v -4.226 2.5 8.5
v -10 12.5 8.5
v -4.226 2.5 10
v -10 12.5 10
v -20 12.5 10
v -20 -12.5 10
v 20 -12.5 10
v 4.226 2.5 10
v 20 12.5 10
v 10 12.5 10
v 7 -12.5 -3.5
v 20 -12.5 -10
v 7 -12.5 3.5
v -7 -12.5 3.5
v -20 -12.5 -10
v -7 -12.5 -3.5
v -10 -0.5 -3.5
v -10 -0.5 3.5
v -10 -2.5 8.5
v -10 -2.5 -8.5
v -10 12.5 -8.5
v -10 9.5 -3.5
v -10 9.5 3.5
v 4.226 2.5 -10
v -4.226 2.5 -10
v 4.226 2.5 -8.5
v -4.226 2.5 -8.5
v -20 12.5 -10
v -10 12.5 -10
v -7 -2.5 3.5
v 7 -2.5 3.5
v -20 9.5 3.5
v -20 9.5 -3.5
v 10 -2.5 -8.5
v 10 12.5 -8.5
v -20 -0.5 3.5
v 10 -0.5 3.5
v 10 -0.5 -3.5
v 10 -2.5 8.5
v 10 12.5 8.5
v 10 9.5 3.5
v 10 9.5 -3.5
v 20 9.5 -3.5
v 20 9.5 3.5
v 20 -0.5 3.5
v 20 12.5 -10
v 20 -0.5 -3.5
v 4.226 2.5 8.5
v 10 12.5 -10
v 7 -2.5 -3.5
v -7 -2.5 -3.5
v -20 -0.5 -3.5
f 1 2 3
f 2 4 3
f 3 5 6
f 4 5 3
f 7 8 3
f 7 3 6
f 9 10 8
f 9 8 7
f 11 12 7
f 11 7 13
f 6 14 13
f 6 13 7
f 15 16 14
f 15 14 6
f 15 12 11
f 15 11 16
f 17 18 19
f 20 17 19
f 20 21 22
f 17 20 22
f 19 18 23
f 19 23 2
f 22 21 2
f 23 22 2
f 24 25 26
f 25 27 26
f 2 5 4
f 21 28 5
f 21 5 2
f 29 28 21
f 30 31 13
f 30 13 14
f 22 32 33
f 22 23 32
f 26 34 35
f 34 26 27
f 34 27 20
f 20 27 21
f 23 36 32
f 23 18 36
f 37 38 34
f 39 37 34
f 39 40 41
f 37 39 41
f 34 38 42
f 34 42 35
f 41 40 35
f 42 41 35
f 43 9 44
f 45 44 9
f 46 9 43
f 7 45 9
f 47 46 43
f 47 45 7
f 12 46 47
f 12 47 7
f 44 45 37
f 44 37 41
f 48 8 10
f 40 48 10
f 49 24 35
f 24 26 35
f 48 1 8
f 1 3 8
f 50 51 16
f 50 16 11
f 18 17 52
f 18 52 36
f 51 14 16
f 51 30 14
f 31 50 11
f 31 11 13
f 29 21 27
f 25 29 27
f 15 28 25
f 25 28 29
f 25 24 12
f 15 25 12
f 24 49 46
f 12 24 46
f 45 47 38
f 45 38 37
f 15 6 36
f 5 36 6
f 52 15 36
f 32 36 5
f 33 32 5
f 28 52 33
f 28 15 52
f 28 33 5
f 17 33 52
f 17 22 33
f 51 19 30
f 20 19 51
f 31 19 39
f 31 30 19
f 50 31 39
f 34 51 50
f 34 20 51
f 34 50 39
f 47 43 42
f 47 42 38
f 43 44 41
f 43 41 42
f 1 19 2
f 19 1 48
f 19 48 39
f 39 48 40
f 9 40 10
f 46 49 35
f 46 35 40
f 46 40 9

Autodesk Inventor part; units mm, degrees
ref_plane "YZ Plane" through (0, 0, 0) normal (1, 0, 0) x (0, 1, 0)
ref_plane "XZ Plane" through (0, 0, 0) normal (0, 1, 0) x (-1, 0, 0)
ref_plane "XY Plane" through (0, 0, 0) normal (0, 0, 1) x (1, 0, 0)
sketch "Náčrt1" plane through (0, 0, 0) normal (0, 0, 1) x (1, 0, 0)
  line L0 (0, 17.5) -> (0, -17.5) projected
  line L1 (-28, 0) -> (28, 0) projected
  line L2 (-20, 12.5) -> (20, 12.5)
  line L3 (20, 12.5) -> (20, -12.5)
  line L4 (20, -12.5) -> (-20, -12.5)
  line L5 (-20, -12.5) -> (-20, 12.5)
  point P0 (0, 0)
  dimension "d0" = 40
  dimension "d1" = 25
extrude "Vysunutí1" add sketch "Náčrt1" along normal mid plane 20
sketch "Náčrt2" plane through (-20, 12.5, -10) normal (0, 1, 0) x (1, 0, 0)
  line L0 (0, 0) -> (40, 0) projected
  line L1 (0, 0) -> (0, -20) projected
  line L2 (40, -20) -> (0, -20) projected
  line L3 (40, 0) -> (40, -20) projected
  line L4 (-8, -10) -> (48, -10) projected
  line L5 (20, 4) -> (20, -24) projected
  line L6 (10, -18.5) -> (30, -18.5)
  line L7 (30, -18.5) -> (30, -1.5)
  line L8 (30, -1.5) -> (10, -1.5)
  line L9 (10, -1.5) -> (10, -18.5)
  point P0 (20, -10)
  dimension "d4" = 17
  dimension "d5" = 20
extrude "Vysunutí2" cut sketch "Náčrt2" against normal blind 15 contours L8 L7 L4 L5 | L5 L4 L9 L8 | L4 L5 L6 L9 | L4 L7 L6 L5
sketch "Náčrt3" plane through (0, 0, 10) normal (0, 0, 1) x (1, 0, 0)
  line L0 (-20, -12.5) -> (20, -12.5) projected
  line L1 (20, -12.5) -> (20, 12.5) projected
  line L2 (20, 12.5) -> (-20, 12.5) projected
  line L3 (-20, 12.5) -> (-20, -12.5) projected
  line L4 (-10, 12.5) -> (-10, -2.5) projected
  line L5 (10, 12.5) -> (10, -2.5) projected
  line L6 (10, -2.5) -> (-10, -2.5) projected
  line L7 (-28, 0) -> (28, 0) projected
  line L8 (0, -17.5) -> (0, 17.5) projected
  line L9 (-10, 12.5) -> (-4.2265, 2.5)
  line L10 (-4.2265, 2.5) -> (4.2265, 2.5)
  line L11 (-20, 12.5) -> (20, 12.5) projected
  line L12 (4.2265, 2.5) -> (10, 12.5)
  line L13 (-10, 12.5) -> (10, 12.5)
  point P0 (0, 0)
  point P1 (0, 3.8397)
  dimension "d8" = 5
  dimension "d9" = 30
  dimension "d10" = 30
extrude "Vysunutí3" cut sketch "Náčrt3" against normal through all contours L2 L8 L10 L9 | L8 L2 L12 L10
sketch "Náčrt5" plane through (20, -12.5, 10) normal (1, 0, 0) x (0, 0, -1)
  line L0 (20, 25) -> (0, 25) projected
  line L1 (0, 0) -> (0, 25) projected
  line L2 (20, 0) -> (0, 0) projected
  line L3 (20, 25) -> (20, 0) projected
  line L4 (18.5, 25) -> (18.5, 10) projected
  line L5 (18.5, 10) -> (1.5, 10) projected
  line L6 (1.5, 25) -> (1.5, 10) projected
  line L7 (10, -5) -> (10, 30) projected
  line L8 (-4, 12.5) -> (24, 12.5) projected
  line L9 (6.5, 22) -> (13.5, 22)
  line L10 (13.5, 22) -> (13.5, 12)
  line L11 (13.5, 12) -> (6.5, 12)
  line L12 (6.5, 12) -> (6.5, 22)
  line L13 (10, 22) -> (10, 12.5)
  line L14 (13.5, 12.5) -> (10, 12.5)
  line L15 (10, 22) -> (13.5, 22)
  line L16 (13.5, 12.5) -> (13.5, 22)
  dimension "d16" = 7
  dimension "d17" = 10
  dimension "d18" = 3
extrude "Vysunutí4" cut sketch "Náčrt5" against normal through all contours L9 L10 L8 L7 | L7 L8 L12 L9 | L10 L11 L7 L8 | L7 L11 L12 L8
sketch "Náčrt6" plane through (-20, -2.5, -10) normal (0, 1, 0) x (1, 0, 0)
  line L0 (30, -18.5) -> (10, -18.5) projected
  line L1 (30, -1.5) -> (30, -18.5) projected
  line L2 (10, -1.5) -> (30, -1.5) projected
  line L3 (10, -18.5) -> (10, -1.5) projected
  line L4 (-8, -10) -> (48, -10) projected
  line L5 (20, 4) -> (20, -24) projected
  line L6 (13, -6.5) -> (27, -6.5)
  line L7 (27, -6.5) -> (27, -13.5)
  line L8 (27, -13.5) -> (13, -13.5)
  line L9 (13, -13.5) -> (13, -6.5)
  point P0 (20, -10)
  dimension "d21" = 7
  dimension "d22" = 14
  dimension "d23" = 3
extrude "Vysunutí5" cut sketch "Náčrt6" against normal through all contours L8 L9 L4 L5 | L5 L4 L7 L8 | L4 L5 L6 L7 | L4 L9 L6 L5
properties part number "uhelnik_30x30_3D tisk"
